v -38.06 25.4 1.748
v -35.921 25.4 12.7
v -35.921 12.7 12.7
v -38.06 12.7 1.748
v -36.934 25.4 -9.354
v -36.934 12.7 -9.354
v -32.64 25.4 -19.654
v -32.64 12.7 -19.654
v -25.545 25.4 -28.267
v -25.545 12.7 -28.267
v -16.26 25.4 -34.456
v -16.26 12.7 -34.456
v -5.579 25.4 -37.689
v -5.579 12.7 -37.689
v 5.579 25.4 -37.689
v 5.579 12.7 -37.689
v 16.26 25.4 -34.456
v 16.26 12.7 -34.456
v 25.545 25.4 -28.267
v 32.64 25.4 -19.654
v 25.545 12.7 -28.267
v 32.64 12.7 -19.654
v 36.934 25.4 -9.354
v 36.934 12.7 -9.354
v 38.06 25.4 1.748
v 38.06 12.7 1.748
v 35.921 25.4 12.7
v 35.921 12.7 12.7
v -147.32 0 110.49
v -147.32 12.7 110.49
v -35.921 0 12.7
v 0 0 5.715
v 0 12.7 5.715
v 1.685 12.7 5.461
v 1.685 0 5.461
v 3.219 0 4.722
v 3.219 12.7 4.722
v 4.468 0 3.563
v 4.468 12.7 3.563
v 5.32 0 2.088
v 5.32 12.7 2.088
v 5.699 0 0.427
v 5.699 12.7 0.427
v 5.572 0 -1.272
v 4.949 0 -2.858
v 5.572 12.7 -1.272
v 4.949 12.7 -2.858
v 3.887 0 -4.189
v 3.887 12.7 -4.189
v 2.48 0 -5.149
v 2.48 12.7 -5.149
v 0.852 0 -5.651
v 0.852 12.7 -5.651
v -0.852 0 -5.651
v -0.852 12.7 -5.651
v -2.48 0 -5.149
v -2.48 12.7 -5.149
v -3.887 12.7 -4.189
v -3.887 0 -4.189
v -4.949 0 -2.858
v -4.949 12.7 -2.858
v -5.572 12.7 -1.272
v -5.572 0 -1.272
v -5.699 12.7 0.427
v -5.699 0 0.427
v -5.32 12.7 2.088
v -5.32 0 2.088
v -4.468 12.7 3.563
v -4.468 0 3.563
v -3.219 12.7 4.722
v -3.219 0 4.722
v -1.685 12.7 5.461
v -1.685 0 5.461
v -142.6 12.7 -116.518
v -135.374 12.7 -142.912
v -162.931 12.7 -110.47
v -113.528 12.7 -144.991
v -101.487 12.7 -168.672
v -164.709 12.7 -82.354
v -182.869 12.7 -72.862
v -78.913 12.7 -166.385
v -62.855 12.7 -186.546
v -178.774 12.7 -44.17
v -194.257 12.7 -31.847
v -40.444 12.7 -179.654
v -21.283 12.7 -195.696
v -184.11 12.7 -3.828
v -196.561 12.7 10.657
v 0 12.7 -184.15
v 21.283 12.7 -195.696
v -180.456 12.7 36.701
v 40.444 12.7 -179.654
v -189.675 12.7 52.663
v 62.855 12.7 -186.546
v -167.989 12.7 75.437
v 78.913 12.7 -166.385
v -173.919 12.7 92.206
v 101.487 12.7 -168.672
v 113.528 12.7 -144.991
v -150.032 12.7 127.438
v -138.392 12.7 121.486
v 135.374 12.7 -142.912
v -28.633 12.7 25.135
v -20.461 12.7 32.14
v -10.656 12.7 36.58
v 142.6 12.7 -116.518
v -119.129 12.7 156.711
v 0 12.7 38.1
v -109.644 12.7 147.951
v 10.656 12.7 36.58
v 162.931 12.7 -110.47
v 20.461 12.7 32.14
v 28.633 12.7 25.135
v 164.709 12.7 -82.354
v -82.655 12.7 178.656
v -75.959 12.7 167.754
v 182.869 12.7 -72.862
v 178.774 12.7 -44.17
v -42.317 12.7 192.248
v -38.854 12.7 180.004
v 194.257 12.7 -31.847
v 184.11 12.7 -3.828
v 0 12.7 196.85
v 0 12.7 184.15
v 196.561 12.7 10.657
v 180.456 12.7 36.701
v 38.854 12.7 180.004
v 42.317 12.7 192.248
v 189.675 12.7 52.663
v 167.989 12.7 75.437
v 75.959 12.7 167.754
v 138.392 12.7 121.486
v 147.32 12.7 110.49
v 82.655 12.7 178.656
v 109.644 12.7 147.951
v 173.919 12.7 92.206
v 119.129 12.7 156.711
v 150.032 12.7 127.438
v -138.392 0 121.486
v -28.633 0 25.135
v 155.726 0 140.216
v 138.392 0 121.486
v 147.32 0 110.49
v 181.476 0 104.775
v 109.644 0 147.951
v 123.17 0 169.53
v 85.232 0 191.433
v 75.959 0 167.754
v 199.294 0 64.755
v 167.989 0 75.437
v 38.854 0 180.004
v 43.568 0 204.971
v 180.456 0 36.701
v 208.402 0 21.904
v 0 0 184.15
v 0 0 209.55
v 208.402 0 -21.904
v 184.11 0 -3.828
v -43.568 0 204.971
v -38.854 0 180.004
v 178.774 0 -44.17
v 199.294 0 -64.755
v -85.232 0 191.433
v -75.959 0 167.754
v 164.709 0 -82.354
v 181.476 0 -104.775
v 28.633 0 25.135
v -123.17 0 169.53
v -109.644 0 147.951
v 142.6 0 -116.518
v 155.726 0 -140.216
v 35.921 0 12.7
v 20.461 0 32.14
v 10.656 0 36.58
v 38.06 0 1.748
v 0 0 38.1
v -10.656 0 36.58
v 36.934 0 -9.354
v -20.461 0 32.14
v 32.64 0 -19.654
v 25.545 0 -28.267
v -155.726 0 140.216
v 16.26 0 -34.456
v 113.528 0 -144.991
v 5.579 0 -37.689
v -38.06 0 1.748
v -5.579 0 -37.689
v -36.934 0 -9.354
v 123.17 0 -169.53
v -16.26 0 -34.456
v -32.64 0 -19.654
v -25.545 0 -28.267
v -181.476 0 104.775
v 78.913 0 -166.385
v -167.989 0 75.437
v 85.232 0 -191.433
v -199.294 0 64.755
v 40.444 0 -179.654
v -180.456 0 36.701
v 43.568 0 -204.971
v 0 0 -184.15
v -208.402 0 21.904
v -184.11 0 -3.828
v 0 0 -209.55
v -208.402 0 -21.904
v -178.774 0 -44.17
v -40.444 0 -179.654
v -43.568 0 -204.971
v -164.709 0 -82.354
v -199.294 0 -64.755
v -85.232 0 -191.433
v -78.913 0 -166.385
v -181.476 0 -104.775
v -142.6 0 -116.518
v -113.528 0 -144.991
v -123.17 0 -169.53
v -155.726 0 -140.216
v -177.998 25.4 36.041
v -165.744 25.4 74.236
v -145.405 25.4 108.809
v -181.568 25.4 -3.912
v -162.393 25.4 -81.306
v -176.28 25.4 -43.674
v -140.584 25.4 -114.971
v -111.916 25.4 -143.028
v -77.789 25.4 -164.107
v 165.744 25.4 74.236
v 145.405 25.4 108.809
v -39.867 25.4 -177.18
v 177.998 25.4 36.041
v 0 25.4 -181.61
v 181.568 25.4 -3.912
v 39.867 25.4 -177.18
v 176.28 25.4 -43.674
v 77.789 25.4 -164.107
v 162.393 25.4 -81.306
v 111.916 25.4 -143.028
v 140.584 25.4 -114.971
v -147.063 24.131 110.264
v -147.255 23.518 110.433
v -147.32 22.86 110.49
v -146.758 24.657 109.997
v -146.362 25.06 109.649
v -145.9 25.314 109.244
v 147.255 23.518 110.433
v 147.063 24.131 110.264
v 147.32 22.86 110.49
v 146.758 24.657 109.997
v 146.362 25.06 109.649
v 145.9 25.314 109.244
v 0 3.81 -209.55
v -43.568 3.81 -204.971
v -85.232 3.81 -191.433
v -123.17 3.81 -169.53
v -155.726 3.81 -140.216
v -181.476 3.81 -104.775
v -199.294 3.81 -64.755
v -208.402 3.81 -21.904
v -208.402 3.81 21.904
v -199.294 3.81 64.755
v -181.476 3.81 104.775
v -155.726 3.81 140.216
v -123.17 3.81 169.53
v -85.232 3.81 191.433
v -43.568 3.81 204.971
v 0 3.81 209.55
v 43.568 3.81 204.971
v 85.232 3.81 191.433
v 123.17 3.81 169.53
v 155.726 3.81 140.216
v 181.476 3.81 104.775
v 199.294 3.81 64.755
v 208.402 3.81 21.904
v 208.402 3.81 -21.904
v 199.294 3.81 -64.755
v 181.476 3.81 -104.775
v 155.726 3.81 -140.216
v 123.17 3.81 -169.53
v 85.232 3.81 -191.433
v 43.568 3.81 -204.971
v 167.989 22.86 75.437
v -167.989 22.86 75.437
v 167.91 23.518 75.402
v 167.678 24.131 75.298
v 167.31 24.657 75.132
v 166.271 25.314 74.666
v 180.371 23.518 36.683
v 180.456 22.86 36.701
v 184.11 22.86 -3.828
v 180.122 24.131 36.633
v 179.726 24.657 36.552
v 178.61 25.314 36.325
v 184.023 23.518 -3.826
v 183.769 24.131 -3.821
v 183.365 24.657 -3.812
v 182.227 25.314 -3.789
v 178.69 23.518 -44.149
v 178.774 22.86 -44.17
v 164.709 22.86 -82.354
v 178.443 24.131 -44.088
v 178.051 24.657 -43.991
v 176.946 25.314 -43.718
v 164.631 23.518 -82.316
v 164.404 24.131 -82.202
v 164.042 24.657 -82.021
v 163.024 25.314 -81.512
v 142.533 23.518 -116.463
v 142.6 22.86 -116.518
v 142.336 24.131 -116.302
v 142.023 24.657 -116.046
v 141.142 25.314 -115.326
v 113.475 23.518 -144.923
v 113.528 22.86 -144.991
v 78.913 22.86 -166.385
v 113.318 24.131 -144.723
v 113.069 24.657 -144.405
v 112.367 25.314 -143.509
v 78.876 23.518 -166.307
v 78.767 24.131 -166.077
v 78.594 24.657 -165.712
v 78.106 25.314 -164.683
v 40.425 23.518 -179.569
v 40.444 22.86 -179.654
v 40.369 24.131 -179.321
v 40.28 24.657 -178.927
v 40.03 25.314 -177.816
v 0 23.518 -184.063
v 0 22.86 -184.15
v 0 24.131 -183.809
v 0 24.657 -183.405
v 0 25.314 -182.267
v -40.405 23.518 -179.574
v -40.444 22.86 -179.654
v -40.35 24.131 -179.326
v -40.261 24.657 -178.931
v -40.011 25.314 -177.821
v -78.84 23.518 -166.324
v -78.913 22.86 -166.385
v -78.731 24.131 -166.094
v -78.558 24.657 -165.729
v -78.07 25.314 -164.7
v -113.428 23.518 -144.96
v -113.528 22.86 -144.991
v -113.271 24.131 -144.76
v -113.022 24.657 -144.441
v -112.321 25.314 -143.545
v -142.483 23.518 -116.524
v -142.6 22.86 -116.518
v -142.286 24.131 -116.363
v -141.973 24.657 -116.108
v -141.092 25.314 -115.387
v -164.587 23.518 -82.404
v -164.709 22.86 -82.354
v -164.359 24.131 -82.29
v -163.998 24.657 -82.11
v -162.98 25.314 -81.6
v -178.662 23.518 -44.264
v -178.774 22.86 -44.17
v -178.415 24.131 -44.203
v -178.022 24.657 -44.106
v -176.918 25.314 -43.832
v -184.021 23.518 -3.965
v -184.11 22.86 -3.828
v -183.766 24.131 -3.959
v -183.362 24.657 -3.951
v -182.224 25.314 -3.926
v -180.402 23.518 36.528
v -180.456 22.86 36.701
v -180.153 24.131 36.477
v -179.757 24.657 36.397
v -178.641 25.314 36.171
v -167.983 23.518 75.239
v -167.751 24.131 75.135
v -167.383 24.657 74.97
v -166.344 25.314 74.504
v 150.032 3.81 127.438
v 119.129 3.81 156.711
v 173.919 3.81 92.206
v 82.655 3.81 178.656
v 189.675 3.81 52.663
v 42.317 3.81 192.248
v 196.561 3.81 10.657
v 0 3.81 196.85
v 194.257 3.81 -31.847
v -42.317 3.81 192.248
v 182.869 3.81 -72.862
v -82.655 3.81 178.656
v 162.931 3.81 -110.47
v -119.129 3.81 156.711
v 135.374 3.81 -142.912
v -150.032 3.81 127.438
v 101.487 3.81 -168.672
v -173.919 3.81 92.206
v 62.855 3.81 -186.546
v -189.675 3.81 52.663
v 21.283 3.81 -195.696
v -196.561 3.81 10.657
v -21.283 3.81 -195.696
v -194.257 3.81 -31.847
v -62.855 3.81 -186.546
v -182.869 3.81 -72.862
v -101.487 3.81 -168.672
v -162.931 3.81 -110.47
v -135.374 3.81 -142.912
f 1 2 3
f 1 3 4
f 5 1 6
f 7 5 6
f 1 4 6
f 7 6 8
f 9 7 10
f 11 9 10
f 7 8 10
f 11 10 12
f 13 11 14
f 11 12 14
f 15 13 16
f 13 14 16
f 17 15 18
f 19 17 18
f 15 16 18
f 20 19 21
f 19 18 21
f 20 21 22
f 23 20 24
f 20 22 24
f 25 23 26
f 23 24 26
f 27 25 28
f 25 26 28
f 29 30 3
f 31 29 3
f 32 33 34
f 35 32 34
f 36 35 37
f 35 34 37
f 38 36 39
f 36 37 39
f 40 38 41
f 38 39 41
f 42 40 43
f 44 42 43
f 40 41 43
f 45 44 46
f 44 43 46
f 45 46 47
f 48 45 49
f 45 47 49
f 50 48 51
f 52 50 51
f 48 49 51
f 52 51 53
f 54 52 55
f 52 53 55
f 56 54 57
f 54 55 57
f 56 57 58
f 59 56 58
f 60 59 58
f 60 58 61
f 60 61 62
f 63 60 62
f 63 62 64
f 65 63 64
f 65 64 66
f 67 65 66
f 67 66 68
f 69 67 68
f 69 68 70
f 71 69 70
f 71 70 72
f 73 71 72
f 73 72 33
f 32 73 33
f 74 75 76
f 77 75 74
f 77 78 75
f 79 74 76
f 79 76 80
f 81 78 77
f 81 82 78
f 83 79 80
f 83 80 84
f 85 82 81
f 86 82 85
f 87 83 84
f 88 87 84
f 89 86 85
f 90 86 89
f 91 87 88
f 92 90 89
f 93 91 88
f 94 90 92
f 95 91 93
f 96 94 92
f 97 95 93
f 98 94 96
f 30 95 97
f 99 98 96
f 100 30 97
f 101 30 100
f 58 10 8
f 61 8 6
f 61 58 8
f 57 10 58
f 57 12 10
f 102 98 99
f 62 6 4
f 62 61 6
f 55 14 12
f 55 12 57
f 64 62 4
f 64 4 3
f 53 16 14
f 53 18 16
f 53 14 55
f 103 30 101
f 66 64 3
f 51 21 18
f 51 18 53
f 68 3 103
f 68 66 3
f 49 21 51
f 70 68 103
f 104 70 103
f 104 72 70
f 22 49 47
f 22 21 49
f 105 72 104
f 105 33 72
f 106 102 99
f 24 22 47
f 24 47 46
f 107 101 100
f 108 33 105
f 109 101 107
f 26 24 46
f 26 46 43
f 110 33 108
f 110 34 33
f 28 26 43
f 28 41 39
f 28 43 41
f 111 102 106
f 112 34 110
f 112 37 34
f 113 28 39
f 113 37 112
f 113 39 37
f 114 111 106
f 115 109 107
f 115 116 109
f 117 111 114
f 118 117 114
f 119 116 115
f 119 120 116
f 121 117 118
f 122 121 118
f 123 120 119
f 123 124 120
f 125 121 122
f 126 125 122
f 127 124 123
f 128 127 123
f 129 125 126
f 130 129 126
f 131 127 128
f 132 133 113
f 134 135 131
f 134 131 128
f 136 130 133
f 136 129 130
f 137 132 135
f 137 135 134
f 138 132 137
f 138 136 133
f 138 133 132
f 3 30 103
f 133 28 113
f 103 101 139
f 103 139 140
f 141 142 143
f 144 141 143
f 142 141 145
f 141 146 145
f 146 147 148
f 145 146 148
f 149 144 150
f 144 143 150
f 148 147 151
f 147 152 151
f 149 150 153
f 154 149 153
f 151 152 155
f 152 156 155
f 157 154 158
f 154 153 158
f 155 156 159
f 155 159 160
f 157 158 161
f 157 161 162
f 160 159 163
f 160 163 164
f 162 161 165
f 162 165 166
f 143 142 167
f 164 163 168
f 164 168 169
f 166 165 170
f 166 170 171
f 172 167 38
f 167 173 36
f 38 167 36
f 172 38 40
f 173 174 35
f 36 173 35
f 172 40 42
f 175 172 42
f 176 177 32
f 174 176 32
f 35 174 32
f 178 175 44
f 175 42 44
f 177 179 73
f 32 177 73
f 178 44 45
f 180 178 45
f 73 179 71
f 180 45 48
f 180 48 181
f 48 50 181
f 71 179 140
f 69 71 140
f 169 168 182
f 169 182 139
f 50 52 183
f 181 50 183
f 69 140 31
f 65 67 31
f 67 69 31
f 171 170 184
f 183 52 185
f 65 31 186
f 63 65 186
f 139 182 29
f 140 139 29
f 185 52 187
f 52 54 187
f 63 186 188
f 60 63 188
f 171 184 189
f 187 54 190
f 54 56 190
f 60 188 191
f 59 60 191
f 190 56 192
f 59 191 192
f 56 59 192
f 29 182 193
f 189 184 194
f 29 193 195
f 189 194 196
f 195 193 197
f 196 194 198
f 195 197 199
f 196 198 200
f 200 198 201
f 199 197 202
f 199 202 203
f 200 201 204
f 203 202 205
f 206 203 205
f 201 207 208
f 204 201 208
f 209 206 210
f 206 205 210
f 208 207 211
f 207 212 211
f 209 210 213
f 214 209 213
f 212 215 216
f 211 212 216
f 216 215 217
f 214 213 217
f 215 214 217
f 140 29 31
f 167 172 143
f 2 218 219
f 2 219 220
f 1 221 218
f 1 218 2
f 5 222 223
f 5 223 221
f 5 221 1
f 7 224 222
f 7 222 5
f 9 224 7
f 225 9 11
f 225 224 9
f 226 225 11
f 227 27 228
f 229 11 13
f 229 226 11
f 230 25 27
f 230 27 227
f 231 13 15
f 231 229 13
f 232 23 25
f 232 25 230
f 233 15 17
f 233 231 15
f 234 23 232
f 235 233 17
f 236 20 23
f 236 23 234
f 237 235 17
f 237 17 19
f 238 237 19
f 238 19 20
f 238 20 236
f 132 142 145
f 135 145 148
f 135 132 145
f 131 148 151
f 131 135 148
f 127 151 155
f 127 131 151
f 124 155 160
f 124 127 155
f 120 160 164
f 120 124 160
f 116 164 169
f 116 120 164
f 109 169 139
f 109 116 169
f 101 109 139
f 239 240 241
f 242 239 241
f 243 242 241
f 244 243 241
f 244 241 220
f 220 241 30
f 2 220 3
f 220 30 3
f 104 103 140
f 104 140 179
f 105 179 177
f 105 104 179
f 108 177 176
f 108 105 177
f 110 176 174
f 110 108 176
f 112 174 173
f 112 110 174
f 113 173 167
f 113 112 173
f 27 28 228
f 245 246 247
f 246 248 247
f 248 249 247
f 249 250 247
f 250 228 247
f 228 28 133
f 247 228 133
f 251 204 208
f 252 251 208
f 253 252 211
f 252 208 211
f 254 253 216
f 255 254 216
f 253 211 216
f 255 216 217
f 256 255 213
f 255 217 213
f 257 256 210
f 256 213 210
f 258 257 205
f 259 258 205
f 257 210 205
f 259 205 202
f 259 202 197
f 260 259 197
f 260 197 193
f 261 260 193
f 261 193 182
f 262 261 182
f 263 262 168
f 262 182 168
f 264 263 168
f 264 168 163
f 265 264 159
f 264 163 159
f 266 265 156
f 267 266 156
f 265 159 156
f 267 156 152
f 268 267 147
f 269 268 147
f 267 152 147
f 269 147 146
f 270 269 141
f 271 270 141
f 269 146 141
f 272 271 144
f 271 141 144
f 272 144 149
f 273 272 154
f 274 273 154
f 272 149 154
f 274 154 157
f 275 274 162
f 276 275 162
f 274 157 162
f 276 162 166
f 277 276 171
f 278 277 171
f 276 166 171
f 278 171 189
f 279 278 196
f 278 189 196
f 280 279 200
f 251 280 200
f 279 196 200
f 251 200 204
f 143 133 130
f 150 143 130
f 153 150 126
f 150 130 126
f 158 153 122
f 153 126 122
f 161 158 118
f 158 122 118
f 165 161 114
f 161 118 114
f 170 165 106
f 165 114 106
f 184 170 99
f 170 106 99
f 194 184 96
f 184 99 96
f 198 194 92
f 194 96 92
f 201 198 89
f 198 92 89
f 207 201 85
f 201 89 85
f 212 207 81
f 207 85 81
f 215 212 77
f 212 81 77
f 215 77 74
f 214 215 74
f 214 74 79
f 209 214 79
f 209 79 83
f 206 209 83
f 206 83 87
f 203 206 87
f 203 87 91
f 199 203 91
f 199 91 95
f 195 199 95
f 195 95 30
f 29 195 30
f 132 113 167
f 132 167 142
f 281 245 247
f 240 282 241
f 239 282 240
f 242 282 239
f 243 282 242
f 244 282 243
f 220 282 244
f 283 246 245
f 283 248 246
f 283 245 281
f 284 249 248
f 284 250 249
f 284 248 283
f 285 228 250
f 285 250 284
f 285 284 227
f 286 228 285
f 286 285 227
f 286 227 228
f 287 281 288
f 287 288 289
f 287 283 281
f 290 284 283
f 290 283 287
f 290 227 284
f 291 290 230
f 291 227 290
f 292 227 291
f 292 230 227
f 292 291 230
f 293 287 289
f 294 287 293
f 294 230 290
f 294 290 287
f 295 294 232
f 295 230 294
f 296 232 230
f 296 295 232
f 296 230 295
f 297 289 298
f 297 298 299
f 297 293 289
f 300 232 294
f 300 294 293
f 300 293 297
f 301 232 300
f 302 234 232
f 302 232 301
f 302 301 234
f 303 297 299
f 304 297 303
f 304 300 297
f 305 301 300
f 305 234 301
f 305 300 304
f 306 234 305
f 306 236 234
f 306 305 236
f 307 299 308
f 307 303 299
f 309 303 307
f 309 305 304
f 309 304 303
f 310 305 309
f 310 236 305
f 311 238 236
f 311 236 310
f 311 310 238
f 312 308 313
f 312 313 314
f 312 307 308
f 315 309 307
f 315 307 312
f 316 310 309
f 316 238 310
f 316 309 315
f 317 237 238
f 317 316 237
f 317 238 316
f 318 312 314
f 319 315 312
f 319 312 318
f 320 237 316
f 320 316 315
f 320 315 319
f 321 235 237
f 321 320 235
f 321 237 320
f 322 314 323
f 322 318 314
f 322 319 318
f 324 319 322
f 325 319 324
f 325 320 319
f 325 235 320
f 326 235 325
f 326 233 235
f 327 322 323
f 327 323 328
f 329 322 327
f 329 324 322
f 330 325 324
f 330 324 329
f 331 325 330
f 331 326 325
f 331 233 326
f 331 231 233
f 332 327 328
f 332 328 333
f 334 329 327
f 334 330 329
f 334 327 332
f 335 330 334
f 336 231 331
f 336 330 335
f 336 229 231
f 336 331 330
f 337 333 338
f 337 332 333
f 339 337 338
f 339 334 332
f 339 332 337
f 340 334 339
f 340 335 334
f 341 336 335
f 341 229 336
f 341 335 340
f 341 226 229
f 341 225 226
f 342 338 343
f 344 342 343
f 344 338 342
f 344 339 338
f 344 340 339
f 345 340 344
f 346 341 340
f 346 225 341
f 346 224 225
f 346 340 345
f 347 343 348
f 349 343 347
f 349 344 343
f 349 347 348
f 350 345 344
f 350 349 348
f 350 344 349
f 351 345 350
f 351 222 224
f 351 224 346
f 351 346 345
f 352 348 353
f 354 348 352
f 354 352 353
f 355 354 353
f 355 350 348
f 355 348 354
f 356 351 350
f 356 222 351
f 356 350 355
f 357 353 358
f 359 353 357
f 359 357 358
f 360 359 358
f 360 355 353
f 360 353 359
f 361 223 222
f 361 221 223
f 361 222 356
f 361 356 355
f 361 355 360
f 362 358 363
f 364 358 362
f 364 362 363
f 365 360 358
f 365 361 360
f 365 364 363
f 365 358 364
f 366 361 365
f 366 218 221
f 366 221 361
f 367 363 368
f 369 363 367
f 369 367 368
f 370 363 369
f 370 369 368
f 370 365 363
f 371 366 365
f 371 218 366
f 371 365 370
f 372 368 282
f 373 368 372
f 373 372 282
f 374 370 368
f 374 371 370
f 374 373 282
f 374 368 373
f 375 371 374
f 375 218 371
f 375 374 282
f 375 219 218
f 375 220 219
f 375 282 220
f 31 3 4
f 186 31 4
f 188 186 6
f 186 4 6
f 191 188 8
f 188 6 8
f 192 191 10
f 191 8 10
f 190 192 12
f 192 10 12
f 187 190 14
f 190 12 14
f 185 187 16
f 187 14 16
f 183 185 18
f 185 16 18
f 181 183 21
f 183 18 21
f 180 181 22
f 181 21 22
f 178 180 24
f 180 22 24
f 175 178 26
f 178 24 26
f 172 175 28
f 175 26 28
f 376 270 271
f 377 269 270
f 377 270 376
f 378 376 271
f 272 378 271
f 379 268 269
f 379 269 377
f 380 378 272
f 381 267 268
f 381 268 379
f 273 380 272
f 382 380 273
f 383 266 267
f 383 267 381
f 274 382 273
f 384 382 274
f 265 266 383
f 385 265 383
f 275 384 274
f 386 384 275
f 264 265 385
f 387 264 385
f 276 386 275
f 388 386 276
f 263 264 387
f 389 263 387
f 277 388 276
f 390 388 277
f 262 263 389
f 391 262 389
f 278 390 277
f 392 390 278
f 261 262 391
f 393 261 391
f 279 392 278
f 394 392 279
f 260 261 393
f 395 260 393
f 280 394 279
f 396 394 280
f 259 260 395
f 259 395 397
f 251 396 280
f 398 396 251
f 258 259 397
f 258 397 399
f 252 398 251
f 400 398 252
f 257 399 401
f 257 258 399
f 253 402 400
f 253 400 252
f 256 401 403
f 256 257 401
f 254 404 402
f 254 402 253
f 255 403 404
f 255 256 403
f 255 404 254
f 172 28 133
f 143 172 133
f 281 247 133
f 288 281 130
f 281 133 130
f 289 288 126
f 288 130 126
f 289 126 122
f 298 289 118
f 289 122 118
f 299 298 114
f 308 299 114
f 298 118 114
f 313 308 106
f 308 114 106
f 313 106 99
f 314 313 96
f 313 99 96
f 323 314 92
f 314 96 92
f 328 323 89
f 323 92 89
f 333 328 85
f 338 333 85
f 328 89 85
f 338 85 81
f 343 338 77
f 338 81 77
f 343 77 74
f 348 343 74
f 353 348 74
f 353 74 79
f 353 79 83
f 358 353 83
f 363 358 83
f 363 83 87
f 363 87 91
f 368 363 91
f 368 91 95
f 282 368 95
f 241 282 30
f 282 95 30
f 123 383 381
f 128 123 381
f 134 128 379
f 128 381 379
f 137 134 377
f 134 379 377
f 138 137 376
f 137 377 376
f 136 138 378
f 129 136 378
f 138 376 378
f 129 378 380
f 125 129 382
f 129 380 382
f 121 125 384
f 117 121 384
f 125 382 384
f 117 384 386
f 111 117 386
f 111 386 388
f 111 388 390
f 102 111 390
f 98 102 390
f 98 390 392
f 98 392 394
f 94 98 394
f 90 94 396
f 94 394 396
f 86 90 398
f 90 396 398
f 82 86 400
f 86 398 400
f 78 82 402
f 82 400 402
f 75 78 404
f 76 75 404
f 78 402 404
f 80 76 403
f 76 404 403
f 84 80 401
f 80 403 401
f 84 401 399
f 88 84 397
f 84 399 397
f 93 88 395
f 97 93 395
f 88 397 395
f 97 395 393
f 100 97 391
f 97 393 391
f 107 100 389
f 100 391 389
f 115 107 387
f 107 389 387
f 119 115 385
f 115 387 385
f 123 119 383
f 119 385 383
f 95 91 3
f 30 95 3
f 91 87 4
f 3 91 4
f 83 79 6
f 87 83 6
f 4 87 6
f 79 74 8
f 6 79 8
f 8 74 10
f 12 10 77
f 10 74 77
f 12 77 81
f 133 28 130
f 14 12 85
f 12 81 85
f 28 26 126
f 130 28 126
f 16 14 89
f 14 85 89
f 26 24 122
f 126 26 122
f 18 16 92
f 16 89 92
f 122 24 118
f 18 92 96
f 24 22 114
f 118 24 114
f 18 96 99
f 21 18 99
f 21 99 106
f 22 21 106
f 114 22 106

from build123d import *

# Parameters (mm, degrees)
SKETCH1_R           = 209.55
BOSS_EXTRUDE1_DEPTH = 3.81
SKETCH2_R           = 196.85
BOSS_EXTRUDE2_DEPTH = 8.89
SKETCH3_R           = 5.715
CUT_EXTRUDE1_DEPTH  = 297.620456139
BOSS_EXTRUDE3_DEPTH = 12.7
CUT_EXTRUDE2_DEPTH  = 297.620456139
FILLET1_R           = 2.54


with BuildPart() as part:
    # Sketch1 → Boss-Extrude1 (new body)
    with BuildSketch(Plane(origin=(0, 0, 0), x_dir=(1, 0, 0), z_dir=(0, 1, 0))):
        Circle(SKETCH1_R)
    extrude(amount=BOSS_EXTRUDE1_DEPTH)

    # Sketch2 → Boss-Extrude2 (add)
    with BuildSketch(Plane(origin=(0, 3.81, 0), x_dir=(1, 0, 0), z_dir=(0, 1, 0))):
        Circle(SKETCH2_R)
    extrude(amount=BOSS_EXTRUDE2_DEPTH)

    # Sketch3 → Cut-Extrude1 (cut, through all)
    with BuildSketch(Plane(origin=(0, 12.7, 0), x_dir=(1, 0, 0), z_dir=(0, 1, 0))):
        Circle(SKETCH3_R)
    extrude(amount=-CUT_EXTRUDE1_DEPTH, mode=Mode.SUBTRACT)

    # Sketch4 → Boss-Extrude3 (add)
    with BuildSketch(Plane(origin=(0, 12.7, 0), x_dir=(1, 0, 0), z_dir=(0, 1, 0))):
        with BuildLine():
            Line((-147.32, -110.49), (-35.921024484, -12.7))
            ThreePointArc((-35.921024484, -12.7), (0, 38.1), (35.921024484, -12.7))
            Line((35.921024484, -12.7), (147.32, -110.49))
            ThreePointArc((147.32, -110.49), (0, 184.15), (-147.32, -110.49))
        make_face()
    extrude(amount=BOSS_EXTRUDE3_DEPTH)

    # Sketch4<3> → Cut-Extrude2 (cut, through all)
    with BuildSketch(Plane(origin=(0, 12.7, 0), x_dir=(1, 0, 0), z_dir=(0, 1, 0))):
        with BuildLine():
            Line((-147.32, -110.49), (-35.921024484, -12.7))
            ThreePointArc((-35.921024484, -12.7), (0, 38.1), (35.921024484, -12.7))
            Line((35.921024484, -12.7), (147.32, -110.49))
            ThreePointArc((147.32, -110.49), (0, 184.15), (-147.32, -110.49))
        make_face()
        with BuildLine():
            Line((-138.392335529, -121.485735652), (-28.632897006, -25.13497979))
            ThreePointArc((-28.632897006, -25.13497979), (0, -38.1), (28.632897006, -25.13497979))
            Line((28.632897006, -25.13497979), (138.392335529, -121.485735652))
            ThreePointArc((138.392335529, -121.485735652), (0, -184.15), (-138.392335529, -121.485735652))
        make_face()
    extrude(amount=-CUT_EXTRUDE2_DEPTH, mode=Mode.SUBTRACT)


with BuildPart() as cut_extrude2_piece_1:
    # of the separate pieces the step leaves, piece 1, a body of its own (cut_extrude2_pieces)
    add(part.part.solids().sort_by_distance((-147.32, 25.4, 110.49))[0])

    # Fillet1
    fillet1_edges = [cut_extrude2_piece_1.edges().sort_by_distance(p)[0] for p in [
        (0, 25.4, -184.15),
    ]]
    fillet(fillet1_edges, radius=FILLET1_R)


with BuildPart() as cut_extrude2_piece_2:
    # of the separate pieces the step leaves, piece 2, a body of its own (cut_extrude2_pieces)
    add(part.part.solids().sort_by_distance((209.55, 0, 0))[0])


solid = Compound([cut_extrude2_piece_1.part, cut_extrude2_piece_2.part])
